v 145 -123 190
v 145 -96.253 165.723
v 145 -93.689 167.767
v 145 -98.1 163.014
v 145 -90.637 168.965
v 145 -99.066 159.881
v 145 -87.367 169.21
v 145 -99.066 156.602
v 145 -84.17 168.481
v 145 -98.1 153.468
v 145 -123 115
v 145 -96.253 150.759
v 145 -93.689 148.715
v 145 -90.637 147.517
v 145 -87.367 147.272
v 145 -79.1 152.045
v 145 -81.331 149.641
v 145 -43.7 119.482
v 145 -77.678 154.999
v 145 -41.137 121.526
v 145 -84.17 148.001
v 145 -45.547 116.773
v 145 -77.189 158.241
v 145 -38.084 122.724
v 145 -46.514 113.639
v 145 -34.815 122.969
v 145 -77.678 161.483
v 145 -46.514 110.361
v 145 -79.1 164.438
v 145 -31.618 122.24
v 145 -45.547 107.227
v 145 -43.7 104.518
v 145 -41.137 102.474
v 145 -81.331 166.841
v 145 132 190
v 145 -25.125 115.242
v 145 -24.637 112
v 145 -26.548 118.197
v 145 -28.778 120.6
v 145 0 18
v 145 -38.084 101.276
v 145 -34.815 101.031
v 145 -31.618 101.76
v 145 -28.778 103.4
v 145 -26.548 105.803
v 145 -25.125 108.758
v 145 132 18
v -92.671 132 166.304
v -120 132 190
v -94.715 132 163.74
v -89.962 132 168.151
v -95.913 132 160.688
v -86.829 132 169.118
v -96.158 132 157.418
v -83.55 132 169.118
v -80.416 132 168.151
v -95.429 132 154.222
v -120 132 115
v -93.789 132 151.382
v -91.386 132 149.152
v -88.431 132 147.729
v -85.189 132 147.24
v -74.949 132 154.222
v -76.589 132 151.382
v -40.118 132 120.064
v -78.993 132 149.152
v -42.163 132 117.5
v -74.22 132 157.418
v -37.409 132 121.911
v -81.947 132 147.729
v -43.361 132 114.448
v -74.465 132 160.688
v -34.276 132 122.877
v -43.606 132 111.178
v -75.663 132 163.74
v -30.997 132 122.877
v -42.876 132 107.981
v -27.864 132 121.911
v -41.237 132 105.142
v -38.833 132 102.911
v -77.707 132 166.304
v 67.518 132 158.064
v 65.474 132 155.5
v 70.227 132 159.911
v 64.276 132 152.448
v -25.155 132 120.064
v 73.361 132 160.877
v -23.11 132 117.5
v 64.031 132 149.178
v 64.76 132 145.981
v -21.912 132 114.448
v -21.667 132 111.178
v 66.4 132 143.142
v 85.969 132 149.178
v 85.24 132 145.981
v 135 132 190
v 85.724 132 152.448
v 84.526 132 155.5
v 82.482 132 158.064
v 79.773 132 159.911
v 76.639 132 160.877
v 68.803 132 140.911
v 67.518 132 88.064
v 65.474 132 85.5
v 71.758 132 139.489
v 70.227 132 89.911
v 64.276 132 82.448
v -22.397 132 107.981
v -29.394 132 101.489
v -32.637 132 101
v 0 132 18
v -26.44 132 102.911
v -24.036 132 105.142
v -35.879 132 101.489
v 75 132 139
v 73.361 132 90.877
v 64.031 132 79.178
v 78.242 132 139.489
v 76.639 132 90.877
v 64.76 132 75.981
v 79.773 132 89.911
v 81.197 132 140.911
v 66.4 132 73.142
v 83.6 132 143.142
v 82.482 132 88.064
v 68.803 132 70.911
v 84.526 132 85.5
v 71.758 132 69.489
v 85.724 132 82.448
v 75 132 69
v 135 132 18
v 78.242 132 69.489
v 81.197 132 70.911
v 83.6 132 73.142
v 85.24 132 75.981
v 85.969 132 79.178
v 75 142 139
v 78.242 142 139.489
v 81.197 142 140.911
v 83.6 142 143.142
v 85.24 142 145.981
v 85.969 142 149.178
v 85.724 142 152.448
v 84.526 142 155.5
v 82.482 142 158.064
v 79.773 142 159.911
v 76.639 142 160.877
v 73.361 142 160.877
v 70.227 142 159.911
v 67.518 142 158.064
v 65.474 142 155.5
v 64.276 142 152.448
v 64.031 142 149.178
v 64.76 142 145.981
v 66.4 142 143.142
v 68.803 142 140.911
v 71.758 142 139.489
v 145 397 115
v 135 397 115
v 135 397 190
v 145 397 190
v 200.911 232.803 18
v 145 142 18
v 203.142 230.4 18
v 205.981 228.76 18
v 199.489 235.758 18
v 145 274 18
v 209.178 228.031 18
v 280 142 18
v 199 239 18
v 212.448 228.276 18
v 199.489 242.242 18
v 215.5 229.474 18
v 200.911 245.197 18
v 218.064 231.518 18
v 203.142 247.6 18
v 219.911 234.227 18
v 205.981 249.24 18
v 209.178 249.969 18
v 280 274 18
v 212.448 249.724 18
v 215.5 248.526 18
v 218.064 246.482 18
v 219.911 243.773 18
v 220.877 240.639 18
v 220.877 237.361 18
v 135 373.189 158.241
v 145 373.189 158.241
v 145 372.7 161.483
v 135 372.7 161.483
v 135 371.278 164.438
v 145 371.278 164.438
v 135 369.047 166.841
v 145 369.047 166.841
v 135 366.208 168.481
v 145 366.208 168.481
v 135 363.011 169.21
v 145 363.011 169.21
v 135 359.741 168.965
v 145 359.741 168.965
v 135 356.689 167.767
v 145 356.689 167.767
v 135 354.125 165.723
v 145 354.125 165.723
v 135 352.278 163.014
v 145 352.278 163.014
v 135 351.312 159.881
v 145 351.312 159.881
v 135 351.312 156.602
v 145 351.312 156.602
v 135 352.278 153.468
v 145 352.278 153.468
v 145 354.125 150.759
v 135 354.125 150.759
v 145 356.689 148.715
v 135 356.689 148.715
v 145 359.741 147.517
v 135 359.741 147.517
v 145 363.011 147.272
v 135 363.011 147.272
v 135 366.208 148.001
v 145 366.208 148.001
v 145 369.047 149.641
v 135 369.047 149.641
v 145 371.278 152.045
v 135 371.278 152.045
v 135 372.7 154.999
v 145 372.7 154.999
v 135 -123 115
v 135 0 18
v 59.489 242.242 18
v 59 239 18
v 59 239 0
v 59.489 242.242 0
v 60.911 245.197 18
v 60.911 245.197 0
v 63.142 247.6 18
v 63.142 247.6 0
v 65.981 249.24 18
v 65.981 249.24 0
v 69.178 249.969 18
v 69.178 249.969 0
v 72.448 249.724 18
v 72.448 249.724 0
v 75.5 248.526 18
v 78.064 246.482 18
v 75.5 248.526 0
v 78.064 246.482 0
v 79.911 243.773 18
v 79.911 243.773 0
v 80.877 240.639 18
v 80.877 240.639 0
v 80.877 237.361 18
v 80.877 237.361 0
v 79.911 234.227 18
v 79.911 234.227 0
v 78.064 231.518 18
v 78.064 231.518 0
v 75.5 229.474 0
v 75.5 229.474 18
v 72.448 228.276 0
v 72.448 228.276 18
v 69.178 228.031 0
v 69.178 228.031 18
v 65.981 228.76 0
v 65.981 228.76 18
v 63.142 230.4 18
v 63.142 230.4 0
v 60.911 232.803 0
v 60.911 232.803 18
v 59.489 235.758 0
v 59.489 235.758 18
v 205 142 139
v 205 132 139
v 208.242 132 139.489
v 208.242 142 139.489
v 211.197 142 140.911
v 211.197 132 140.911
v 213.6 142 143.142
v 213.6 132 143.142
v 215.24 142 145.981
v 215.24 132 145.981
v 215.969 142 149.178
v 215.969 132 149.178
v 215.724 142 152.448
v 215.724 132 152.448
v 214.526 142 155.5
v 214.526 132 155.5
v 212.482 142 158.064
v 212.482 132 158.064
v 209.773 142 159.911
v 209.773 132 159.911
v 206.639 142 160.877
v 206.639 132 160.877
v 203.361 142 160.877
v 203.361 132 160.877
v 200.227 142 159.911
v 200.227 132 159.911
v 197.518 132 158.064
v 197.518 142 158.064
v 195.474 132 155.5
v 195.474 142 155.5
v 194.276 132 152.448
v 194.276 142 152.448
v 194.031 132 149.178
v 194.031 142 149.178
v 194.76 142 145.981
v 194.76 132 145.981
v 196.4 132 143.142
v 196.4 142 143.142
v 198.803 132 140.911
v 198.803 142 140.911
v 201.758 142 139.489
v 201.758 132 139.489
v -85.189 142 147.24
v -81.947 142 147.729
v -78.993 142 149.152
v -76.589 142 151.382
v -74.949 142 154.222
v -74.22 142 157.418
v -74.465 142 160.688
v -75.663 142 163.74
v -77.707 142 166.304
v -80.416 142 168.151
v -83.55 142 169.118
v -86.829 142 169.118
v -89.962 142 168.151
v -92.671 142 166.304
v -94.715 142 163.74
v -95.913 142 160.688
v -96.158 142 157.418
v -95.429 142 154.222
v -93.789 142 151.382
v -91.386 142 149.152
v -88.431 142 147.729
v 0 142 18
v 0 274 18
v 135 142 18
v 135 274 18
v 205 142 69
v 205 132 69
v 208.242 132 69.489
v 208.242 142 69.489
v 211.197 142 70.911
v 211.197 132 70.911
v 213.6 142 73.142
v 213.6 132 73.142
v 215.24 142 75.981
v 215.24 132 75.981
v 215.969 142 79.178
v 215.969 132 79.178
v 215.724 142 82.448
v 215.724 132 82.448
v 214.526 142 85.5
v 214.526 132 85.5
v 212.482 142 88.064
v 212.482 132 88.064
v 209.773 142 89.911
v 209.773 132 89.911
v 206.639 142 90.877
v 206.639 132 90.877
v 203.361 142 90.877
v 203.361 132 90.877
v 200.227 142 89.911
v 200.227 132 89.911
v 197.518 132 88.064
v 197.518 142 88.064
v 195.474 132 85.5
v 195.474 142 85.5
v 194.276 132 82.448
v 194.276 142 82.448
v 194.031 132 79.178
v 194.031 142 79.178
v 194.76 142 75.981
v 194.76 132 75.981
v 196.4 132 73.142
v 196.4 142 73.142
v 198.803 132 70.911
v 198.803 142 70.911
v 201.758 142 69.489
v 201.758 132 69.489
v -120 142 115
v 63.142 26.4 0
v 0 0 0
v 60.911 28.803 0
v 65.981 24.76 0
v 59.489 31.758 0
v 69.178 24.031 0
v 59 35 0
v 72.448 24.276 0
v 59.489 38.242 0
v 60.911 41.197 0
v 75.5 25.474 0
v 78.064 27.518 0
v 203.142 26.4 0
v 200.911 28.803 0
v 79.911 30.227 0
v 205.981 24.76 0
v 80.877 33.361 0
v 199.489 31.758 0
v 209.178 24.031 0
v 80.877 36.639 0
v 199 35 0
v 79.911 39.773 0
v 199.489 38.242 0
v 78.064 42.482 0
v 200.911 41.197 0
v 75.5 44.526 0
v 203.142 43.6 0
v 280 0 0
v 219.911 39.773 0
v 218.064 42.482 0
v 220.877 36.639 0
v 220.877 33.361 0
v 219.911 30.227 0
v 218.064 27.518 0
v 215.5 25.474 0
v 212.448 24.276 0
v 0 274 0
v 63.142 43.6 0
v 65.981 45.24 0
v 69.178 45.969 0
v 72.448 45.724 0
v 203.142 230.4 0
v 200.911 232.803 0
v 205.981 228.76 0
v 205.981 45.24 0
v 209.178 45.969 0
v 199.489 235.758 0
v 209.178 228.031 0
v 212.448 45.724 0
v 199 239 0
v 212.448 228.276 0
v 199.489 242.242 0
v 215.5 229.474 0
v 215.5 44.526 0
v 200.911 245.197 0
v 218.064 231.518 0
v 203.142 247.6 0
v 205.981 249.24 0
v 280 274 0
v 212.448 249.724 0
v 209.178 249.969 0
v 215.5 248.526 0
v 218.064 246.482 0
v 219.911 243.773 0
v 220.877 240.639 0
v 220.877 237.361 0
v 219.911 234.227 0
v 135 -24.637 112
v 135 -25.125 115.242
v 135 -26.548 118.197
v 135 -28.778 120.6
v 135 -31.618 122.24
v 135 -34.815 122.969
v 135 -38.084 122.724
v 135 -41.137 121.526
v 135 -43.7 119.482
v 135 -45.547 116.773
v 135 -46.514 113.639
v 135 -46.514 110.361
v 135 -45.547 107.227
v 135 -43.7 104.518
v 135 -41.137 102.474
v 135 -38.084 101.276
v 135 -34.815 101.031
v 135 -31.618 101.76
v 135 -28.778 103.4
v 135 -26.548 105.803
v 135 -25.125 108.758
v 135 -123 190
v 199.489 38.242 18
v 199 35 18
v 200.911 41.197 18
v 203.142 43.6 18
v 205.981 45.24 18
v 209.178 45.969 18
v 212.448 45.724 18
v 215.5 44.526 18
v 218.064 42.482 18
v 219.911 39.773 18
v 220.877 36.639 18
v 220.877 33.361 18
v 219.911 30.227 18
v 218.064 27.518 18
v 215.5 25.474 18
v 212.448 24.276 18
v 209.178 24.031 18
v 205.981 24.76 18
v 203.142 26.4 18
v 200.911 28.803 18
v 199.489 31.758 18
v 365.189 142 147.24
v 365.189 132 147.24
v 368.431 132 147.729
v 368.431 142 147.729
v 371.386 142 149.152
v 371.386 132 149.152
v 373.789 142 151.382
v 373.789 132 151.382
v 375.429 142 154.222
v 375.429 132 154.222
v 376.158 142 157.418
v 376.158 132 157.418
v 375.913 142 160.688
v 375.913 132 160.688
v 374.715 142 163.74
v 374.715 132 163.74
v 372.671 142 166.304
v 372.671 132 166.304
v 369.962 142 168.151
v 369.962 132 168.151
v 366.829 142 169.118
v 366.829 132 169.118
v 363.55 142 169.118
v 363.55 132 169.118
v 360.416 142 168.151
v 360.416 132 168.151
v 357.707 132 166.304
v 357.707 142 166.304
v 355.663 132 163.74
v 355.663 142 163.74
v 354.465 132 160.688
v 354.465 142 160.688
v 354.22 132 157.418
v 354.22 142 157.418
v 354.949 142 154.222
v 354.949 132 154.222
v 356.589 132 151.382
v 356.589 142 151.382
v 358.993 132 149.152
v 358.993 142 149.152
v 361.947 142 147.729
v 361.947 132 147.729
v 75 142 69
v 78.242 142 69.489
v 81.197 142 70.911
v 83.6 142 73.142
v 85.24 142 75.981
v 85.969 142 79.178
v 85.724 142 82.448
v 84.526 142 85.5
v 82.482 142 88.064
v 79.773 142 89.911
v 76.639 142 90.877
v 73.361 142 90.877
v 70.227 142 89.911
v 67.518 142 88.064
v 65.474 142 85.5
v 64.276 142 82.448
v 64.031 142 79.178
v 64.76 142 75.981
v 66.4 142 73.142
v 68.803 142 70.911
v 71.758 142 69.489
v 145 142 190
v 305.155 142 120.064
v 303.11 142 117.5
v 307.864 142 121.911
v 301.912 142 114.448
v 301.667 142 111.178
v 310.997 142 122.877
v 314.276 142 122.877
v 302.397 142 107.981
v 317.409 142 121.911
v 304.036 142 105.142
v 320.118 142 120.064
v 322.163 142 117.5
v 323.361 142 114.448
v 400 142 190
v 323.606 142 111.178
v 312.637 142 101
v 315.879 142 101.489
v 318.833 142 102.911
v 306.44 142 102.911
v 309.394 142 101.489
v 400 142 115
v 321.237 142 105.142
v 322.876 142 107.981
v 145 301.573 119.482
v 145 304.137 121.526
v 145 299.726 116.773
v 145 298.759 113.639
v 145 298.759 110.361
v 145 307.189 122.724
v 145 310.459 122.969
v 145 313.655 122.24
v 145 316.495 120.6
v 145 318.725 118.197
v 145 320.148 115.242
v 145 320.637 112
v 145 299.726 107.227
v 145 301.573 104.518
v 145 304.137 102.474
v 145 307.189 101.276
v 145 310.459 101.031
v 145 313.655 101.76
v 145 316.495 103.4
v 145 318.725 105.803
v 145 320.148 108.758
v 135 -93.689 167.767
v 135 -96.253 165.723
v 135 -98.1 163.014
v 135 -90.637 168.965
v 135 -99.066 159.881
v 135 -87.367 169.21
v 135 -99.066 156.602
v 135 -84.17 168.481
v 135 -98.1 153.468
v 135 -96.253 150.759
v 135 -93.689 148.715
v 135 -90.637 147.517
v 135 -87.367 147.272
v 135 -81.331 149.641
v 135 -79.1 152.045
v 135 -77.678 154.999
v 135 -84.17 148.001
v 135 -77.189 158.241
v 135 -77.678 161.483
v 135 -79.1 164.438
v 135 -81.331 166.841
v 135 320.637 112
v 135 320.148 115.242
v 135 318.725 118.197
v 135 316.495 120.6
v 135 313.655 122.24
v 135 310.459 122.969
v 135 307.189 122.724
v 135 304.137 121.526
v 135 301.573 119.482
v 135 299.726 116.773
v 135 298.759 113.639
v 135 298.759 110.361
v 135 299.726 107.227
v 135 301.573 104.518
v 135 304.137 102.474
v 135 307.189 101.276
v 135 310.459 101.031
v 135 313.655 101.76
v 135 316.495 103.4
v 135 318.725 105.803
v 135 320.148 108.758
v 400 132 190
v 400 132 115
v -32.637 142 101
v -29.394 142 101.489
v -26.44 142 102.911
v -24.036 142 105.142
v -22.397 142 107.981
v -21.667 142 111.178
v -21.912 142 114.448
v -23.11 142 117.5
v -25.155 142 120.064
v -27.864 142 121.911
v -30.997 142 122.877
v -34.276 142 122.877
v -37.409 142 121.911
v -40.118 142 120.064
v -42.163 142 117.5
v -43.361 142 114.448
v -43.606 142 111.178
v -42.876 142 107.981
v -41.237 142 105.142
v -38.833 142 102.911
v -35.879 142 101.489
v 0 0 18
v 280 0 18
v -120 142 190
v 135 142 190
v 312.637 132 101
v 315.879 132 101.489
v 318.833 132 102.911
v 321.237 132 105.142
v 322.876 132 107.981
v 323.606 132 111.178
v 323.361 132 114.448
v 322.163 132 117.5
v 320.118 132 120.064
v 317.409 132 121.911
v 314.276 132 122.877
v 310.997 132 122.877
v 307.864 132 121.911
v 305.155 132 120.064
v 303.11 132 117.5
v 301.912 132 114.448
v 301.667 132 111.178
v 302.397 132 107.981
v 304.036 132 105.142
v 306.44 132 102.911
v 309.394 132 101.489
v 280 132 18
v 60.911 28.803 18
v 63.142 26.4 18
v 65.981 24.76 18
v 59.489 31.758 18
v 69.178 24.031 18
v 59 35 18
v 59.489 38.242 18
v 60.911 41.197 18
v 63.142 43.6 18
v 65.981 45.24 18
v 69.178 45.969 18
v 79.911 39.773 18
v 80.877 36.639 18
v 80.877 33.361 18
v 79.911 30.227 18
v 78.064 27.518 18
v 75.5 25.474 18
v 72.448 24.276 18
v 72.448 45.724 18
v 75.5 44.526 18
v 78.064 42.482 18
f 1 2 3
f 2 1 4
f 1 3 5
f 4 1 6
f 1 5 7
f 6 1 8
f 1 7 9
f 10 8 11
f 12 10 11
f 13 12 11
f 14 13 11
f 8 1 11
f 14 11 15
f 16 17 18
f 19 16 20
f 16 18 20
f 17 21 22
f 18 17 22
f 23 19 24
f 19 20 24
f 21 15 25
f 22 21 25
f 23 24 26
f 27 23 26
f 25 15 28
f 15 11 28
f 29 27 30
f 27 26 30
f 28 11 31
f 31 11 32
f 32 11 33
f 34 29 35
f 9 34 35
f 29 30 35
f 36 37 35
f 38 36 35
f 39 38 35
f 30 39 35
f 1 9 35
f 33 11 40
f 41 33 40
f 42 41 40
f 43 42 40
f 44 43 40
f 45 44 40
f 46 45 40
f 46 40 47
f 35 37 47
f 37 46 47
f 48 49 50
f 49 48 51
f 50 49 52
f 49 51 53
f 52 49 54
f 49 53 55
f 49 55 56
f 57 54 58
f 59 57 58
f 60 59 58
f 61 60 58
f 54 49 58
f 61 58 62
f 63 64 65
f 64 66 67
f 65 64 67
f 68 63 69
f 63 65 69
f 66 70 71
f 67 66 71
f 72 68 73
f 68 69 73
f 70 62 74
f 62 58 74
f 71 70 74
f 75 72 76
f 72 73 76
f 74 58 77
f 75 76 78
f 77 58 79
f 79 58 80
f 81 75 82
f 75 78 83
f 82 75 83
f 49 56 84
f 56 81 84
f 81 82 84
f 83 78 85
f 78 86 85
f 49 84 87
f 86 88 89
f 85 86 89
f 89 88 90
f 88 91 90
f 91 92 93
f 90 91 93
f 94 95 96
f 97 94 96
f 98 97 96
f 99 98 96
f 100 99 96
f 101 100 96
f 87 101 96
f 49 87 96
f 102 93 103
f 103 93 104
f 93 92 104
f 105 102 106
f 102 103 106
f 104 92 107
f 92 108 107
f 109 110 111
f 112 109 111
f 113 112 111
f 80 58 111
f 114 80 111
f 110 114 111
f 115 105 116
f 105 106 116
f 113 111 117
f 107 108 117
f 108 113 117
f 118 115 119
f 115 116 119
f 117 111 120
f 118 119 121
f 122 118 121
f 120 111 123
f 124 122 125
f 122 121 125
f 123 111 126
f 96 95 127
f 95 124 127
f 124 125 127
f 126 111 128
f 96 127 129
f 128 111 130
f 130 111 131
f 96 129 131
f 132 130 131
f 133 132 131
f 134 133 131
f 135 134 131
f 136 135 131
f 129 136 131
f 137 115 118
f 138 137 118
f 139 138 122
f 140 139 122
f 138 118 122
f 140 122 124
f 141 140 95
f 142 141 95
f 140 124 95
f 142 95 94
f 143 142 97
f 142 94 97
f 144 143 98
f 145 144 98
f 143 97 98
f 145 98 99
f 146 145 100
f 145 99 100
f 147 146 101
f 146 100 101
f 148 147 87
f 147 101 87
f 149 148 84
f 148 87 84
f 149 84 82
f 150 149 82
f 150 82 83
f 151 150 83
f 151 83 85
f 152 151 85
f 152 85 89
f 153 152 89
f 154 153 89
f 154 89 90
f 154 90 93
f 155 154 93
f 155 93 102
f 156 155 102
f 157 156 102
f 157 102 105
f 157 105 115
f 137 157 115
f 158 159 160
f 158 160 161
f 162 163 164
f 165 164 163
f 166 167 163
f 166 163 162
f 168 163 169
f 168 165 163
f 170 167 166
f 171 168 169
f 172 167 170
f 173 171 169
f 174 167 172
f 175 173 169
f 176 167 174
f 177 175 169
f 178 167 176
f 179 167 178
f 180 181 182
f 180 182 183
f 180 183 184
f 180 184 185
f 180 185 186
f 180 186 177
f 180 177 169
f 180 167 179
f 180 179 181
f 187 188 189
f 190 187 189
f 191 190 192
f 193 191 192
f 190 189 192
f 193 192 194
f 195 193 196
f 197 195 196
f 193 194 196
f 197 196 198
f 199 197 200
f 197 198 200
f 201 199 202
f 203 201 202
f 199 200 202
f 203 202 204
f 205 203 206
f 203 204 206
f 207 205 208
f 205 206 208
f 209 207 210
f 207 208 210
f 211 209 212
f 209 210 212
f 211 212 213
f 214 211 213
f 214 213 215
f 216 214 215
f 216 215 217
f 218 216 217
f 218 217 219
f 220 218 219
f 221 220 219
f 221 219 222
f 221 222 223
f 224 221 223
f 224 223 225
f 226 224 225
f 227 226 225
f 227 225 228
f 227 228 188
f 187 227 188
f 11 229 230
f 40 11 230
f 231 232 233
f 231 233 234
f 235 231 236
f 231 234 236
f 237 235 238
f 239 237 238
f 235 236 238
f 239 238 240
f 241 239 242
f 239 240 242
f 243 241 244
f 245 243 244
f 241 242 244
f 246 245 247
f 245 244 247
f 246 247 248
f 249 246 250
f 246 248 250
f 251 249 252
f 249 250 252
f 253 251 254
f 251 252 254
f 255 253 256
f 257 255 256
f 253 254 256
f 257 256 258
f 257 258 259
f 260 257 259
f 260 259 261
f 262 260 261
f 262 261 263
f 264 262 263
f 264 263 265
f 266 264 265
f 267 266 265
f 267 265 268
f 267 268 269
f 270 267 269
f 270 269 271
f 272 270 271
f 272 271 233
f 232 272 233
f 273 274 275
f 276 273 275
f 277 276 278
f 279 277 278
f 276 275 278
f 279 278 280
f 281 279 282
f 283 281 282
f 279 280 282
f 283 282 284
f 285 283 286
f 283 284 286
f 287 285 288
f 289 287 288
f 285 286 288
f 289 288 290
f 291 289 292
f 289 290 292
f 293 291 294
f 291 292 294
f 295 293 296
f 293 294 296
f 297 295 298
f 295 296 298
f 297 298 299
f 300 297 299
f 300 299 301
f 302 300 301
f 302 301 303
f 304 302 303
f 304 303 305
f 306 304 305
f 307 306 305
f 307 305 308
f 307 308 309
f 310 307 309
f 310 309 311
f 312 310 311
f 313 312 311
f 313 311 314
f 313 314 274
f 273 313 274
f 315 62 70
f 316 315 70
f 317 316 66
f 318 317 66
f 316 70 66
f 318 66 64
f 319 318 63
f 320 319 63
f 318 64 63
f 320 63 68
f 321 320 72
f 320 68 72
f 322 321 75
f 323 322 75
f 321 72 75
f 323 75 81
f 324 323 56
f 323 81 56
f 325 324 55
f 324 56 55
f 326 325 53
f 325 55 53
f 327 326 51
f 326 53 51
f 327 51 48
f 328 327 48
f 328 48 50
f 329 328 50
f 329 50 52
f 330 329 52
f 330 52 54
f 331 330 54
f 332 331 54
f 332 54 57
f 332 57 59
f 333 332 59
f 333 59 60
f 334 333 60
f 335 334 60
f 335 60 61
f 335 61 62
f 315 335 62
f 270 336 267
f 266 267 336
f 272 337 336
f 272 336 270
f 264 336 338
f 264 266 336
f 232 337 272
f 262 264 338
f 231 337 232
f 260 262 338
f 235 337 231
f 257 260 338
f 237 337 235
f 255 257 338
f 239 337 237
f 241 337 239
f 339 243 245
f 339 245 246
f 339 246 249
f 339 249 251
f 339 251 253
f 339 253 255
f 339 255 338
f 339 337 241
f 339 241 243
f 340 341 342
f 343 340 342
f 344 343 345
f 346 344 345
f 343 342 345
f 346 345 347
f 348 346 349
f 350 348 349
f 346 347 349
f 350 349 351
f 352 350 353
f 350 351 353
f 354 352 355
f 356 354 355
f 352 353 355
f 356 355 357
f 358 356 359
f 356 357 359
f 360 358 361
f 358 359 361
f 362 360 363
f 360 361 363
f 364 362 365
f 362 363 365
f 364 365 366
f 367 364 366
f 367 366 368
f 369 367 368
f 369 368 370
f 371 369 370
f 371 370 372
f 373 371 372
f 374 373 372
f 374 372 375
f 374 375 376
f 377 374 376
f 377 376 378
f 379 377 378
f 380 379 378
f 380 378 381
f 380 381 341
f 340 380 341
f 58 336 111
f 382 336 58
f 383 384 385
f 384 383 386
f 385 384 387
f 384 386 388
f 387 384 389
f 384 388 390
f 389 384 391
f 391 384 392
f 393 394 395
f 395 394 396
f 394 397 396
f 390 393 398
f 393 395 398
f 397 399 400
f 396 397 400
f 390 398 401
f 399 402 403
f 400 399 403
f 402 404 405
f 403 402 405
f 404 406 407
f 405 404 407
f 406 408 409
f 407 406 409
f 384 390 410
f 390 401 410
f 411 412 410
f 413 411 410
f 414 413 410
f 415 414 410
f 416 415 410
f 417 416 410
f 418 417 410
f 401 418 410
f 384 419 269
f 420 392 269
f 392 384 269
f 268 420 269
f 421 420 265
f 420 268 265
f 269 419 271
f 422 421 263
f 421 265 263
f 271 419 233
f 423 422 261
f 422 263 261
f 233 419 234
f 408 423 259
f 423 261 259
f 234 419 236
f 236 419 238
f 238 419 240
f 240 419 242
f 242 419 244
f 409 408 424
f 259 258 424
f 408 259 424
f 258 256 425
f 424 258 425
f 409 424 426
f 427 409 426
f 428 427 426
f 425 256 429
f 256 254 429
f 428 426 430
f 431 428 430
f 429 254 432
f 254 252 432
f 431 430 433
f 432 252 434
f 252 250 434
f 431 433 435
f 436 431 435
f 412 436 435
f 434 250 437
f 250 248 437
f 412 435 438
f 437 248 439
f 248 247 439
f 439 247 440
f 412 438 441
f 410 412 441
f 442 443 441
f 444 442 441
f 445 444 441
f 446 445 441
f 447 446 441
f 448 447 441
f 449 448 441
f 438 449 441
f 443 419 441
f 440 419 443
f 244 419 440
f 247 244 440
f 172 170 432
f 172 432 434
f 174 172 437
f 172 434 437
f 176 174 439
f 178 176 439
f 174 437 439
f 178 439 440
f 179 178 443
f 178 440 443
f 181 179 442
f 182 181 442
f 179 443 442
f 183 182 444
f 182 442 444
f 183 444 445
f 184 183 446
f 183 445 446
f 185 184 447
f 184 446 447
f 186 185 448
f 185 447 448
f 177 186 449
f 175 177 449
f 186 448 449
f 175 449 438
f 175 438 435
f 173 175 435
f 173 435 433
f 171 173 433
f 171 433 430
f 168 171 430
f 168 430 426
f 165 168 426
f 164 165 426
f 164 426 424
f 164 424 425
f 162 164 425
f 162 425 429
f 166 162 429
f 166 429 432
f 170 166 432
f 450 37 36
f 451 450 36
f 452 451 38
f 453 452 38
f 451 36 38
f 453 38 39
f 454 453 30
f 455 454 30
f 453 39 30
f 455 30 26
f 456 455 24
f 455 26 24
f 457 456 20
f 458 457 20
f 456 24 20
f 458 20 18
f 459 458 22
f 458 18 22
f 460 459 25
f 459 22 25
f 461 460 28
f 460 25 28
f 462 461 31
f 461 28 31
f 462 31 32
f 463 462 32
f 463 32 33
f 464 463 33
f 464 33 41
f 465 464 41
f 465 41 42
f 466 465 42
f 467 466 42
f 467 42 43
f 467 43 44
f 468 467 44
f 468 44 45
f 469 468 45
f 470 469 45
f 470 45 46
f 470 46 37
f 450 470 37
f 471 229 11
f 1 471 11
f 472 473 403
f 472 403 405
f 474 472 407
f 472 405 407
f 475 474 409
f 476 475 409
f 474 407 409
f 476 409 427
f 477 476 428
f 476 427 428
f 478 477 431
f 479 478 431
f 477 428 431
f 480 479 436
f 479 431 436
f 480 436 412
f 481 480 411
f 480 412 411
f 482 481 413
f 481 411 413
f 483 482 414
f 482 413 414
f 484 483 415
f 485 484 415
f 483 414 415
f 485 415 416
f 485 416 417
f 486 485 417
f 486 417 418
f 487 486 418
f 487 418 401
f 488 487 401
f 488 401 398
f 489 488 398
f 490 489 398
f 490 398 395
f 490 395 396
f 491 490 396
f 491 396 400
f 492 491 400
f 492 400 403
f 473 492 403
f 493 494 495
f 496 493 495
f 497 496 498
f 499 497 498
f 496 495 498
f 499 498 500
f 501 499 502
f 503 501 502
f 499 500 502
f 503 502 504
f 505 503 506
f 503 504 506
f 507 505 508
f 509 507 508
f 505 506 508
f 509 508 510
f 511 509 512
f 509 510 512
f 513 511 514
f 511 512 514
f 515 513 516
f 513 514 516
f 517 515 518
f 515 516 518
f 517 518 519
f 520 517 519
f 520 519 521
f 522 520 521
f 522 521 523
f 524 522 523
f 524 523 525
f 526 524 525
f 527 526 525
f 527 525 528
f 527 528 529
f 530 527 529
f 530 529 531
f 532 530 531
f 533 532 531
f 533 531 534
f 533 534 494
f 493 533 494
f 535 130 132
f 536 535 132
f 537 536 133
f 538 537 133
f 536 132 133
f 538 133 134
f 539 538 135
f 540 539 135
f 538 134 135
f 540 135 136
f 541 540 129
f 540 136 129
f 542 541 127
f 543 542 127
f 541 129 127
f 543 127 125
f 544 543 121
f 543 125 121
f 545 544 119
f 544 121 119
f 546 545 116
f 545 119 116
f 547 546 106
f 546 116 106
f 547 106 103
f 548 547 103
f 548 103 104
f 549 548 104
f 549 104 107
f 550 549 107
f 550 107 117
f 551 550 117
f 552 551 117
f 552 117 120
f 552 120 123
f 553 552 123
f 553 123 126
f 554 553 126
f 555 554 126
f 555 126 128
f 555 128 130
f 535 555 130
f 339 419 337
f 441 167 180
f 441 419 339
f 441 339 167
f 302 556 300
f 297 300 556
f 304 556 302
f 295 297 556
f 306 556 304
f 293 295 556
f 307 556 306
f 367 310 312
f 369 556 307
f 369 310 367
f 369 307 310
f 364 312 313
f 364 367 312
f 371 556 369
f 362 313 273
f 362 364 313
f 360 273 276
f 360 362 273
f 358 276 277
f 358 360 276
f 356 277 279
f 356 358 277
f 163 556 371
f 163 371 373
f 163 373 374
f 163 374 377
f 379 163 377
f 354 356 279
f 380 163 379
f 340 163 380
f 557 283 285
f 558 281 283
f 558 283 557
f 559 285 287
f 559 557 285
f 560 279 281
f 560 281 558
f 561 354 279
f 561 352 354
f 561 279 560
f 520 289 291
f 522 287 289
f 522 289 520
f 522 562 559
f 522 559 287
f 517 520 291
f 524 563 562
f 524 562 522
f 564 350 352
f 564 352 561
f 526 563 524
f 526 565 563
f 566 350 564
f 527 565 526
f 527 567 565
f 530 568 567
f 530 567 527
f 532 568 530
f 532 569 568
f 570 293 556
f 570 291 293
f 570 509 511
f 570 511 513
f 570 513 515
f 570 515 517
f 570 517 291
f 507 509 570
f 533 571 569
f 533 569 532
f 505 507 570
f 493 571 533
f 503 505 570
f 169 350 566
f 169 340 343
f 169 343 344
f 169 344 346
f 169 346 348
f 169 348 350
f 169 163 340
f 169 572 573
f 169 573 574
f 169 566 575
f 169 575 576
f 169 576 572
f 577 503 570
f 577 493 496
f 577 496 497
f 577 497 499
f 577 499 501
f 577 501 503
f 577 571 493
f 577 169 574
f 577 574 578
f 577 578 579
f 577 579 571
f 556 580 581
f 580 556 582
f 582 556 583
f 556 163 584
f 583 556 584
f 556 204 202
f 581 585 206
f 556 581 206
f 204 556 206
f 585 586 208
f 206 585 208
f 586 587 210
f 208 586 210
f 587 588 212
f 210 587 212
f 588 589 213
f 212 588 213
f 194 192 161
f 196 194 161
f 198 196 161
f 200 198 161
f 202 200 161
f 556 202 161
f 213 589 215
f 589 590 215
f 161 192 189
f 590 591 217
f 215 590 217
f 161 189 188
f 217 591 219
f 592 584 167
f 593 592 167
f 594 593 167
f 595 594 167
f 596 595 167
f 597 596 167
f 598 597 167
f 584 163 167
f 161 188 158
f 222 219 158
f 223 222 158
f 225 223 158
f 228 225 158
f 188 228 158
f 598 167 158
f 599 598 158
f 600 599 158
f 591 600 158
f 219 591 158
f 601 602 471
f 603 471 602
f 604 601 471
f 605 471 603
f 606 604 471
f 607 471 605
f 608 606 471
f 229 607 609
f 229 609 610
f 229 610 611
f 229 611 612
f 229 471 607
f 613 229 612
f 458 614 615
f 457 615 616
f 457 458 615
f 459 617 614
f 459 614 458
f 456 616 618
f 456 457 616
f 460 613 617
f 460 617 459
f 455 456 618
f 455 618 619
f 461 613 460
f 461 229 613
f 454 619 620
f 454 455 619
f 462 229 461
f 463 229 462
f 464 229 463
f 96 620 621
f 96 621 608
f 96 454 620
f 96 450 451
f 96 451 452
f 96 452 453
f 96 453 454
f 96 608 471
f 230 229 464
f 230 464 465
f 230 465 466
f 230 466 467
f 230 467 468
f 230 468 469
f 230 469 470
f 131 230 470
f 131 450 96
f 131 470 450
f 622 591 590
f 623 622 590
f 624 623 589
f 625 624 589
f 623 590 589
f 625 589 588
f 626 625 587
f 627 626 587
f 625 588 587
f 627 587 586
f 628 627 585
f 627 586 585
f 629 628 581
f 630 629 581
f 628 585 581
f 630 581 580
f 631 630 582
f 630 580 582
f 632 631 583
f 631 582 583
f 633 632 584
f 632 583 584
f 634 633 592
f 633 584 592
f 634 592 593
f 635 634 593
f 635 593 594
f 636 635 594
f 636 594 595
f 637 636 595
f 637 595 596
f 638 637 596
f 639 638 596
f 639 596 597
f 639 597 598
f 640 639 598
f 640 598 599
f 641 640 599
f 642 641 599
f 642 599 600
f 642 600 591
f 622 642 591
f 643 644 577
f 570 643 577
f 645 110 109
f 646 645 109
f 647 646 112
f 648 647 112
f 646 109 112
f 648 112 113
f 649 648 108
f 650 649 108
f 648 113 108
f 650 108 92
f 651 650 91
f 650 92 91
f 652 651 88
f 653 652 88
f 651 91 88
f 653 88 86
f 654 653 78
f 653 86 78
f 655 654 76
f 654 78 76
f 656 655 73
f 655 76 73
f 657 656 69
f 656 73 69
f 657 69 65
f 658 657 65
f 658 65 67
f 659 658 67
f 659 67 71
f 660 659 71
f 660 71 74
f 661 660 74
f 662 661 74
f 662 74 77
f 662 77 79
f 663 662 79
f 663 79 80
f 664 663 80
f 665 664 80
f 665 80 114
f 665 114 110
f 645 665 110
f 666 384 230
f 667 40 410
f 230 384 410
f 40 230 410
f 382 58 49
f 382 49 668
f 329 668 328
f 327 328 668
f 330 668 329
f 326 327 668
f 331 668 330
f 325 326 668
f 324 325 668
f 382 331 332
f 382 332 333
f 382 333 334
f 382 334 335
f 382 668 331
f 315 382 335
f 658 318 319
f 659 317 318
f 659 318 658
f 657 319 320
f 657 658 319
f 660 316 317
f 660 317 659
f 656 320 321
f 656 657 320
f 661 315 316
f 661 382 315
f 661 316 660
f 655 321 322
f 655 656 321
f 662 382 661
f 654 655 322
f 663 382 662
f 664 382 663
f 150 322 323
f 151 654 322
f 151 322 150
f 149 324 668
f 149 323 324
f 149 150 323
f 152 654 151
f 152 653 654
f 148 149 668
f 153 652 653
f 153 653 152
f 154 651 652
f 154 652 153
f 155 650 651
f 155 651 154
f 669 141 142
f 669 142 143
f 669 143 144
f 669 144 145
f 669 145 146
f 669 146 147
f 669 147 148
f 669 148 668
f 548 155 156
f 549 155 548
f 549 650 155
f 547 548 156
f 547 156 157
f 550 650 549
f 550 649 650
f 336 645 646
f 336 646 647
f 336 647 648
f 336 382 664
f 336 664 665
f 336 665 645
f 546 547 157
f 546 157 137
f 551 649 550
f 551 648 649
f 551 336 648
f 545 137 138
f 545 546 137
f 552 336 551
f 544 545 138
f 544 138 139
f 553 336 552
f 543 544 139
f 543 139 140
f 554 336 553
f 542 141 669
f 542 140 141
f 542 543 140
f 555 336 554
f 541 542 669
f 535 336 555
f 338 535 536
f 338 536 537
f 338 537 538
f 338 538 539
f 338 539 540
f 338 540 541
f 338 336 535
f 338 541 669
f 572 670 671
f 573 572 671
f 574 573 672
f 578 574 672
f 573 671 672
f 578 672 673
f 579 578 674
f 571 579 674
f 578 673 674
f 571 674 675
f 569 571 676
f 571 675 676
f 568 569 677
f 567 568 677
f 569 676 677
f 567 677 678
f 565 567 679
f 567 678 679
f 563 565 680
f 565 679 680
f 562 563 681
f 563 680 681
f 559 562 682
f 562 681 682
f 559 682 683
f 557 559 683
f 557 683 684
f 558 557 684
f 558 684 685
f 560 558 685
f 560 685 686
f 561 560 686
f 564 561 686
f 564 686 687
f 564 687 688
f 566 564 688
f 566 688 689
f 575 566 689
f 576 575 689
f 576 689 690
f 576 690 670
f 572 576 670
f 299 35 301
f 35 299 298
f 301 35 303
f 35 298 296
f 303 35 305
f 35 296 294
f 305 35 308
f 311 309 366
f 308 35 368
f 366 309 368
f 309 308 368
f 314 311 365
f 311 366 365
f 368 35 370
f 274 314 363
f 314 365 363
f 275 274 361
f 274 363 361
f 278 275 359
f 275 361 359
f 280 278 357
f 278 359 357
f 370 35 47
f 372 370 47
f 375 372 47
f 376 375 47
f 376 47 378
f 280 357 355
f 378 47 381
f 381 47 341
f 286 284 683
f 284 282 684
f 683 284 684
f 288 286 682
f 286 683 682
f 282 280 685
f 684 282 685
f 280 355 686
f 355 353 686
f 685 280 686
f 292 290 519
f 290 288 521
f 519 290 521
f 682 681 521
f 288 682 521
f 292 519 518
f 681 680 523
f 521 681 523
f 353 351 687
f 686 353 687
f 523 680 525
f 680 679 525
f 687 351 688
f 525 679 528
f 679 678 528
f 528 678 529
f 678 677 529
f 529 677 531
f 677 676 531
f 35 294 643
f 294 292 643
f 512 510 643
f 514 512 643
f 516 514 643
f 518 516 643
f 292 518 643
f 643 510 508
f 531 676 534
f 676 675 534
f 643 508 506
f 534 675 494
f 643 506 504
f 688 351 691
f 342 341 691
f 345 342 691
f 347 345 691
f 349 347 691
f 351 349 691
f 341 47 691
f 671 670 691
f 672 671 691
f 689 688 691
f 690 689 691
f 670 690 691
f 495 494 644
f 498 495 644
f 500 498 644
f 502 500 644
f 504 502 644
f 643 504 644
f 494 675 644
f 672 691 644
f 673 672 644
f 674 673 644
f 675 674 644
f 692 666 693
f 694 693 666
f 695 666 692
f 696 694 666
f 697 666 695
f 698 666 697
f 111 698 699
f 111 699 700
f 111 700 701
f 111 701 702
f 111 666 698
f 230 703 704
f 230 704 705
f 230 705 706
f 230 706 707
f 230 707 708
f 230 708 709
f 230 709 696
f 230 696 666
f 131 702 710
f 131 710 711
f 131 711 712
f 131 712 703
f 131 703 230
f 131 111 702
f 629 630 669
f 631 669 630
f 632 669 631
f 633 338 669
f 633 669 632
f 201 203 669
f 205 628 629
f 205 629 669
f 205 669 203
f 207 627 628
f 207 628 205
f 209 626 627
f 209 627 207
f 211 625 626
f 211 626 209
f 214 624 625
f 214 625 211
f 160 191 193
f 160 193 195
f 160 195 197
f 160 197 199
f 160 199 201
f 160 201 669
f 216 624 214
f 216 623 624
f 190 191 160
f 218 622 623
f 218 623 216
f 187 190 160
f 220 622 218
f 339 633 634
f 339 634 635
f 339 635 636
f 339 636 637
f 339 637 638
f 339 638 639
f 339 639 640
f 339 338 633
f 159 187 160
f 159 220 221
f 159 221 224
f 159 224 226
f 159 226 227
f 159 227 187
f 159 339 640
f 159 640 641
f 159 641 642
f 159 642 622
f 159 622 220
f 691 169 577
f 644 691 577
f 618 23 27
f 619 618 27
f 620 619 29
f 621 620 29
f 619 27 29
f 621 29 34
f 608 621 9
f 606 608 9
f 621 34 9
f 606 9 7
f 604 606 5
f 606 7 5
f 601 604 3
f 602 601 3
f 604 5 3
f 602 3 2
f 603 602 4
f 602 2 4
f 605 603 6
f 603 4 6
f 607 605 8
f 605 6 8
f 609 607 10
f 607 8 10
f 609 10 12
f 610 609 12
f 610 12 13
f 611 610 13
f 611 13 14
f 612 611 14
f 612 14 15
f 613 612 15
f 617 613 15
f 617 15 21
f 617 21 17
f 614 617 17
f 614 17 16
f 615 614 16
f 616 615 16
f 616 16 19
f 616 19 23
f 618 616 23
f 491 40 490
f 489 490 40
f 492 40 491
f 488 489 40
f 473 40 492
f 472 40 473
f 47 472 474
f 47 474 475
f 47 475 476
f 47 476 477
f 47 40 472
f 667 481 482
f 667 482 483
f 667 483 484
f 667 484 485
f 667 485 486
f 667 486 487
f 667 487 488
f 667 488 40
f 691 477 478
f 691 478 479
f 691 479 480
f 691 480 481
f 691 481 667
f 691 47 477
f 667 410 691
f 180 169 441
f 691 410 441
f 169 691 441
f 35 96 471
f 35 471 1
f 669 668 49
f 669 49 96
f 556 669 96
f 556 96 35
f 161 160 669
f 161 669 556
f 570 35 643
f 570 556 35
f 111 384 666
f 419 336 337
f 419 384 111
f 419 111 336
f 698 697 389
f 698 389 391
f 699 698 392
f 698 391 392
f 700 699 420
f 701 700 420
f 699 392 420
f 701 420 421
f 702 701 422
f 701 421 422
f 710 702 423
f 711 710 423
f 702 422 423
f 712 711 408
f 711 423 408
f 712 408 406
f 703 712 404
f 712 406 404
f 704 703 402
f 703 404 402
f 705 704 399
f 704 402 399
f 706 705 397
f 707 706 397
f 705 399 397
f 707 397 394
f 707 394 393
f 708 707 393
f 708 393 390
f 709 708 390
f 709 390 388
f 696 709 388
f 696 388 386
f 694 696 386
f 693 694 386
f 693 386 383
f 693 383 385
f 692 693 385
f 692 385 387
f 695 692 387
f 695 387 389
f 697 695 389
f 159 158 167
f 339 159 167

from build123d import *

# Parameters (mm, degrees)
SKETCH_1_W                  = 280
SKETCH_1_H                  = 274
EXTRUDE_1_DEPTH             = 18
SKETCH_2_W                  = 520
SKETCH_2_H                  = 10
EXTRUDE_2_DEPTH             = 172
SKETCH_3_W                  = 10
SKETCH_3_H                  = 520
EXTRUDE_3_DEPTH             = 172
CUT_EXTRUDE_1_DEPTH         = 514.745072969
CUT_EXTRUDE_2_DEPTH         = 514.745072969
CUT_EXTRUDE_3_DEPTH         = 517.066856134
CUT_EXTRUDE_4_DEPTH         = 517.066856134
SKETCH_9_R                  = 11.000000001
SKETCH_9_R_2                = 11
CUT_EXTRUDE_5_DEPTH         = 517.066856134
SKETCH_10_R                 = 11
CUT_EXTRUDE_6_DEPTH         = 514.745072969
SKETCH_11_R                 = 11
CUT_EXTRUDE_7_DEPTH         = 595.734394499
PATTERN_LINEAR_1_COUNT      = 2
PATTERN_LINEAR_1_PITCH      = 140
PATTERN_LINEAR_1_COUNT_DIR2 = 2
PATTERN_LINEAR_1_PITCH_DIR2 = 204


with BuildPart() as part:
    # 草图1 → 拉伸1 (new body)
    with BuildSketch(Plane.XY):
        with Locations((140, 137)):
            Rectangle(SKETCH_1_W, SKETCH_1_H)
    extrude(amount=EXTRUDE_1_DEPTH)

    # 草图2 → 拉伸2 (add)
    with BuildSketch(Plane.XY.offset(18)):
        with Locations((140, 137)):
            Rectangle(SKETCH_2_W, SKETCH_2_H)
    extrude(amount=EXTRUDE_2_DEPTH)

    # 草图3 → 拉伸3 (add)
    with BuildSketch(Plane.XY.offset(18)):
        with Locations((140, 137)):
            Rectangle(SKETCH_3_W, SKETCH_3_H)
    extrude(amount=EXTRUDE_3_DEPTH)

    # 草图4 → 切除-拉伸1 (cut, through all)
    with BuildSketch(Plane(origin=(145, 0, 0), x_dir=(0, 0, -1), z_dir=(1, 0, 0))):
        Polygon((-115, 397), (-18, 274), (-18, 397), align=None)
    extrude(amount=-CUT_EXTRUDE_1_DEPTH, mode=Mode.SUBTRACT)

    # 草图5 → 切除-拉伸2 (cut, through all)
    with BuildSketch(Plane.ZY.offset(-135)):
        Polygon((115, -123), (18, 0), (18, -123), align=None)
    extrude(amount=-CUT_EXTRUDE_2_DEPTH, mode=Mode.SUBTRACT)

    # 草图6 → 切除-拉伸3 (cut, through all)
    with BuildSketch(Plane(origin=(0, 142, 0), x_dir=(1, 0, 0), z_dir=(0, 1, 0))):
        Polygon((280, -18), (400, -115), (400, -18), align=None)
    extrude(amount=-CUT_EXTRUDE_3_DEPTH, mode=Mode.SUBTRACT)

    # 草图8 → 切除-拉伸4 (cut, through all)
    with BuildSketch(Plane(origin=(0, 142, 0), x_dir=(1, 0, 0), z_dir=(0, 1, 0))):
        Polygon((0, -18), (-120, -115), (-120, -18), align=None)
    extrude(amount=-CUT_EXTRUDE_4_DEPTH, mode=Mode.SUBTRACT)

    # 草图9 → 切除-拉伸5 (cut, through all)
    with BuildSketch(Plane.XZ.offset(-132)):
        with Locations(Location((-85.189055636, 158.240447361, 0), (0, 0, 270))):
            Circle(SKETCH_9_R)
        with Locations(Location((75, 150, 0), (0, 0, 270))):
            Circle(SKETCH_9_R_2)
        with Locations(Location((-32.636595866, 112, 0), (0, 0, 270))):
            Circle(SKETCH_9_R_2)
        with Locations(Location((75, 80, 0), (0, 0, 270))):
            Circle(SKETCH_9_R_2)
        with Locations(Location((205, 150, 0), (0, 0, 270))):
            Circle(SKETCH_9_R_2)
        with Locations(Location((205, 80, 0), (0, 0, 270))):
            Circle(SKETCH_9_R_2)
        with Locations(Location((365.189055636, 158.240447361, 0), (0, 0, 270))):
            Circle(SKETCH_9_R)
        with Locations(Location((312.636595866, 112, 0), (0, 0, 270))):
            Circle(SKETCH_9_R_2)
    extrude(amount=-CUT_EXTRUDE_5_DEPTH, mode=Mode.SUBTRACT)

    # 草图10 → 切除-拉伸6 (cut, through all)
    with BuildSketch(Plane(origin=(145, 0, 0), x_dir=(0, 0, -1), z_dir=(1, 0, 0))):
        with Locations(Location((-158.241096139, 362.189055636, 0), (0, 0, 90))):
            Circle(SKETCH_10_R)
        with Locations(Location((-112, 309.636595866, 0), (0, 0, 90))):
            Circle(SKETCH_10_R)
        with Locations(Location((-112, -35.636595866, 0), (0, 0, 90))):
            Circle(SKETCH_10_R)
        with Locations(Location((-158.241096139, -88.189055636, 0), (0, 0, 90))):
            Circle(SKETCH_10_R)
    extrude(amount=-CUT_EXTRUDE_6_DEPTH, mode=Mode.SUBTRACT)

    # 草图11 → 切除-拉伸7 (cut, through all)
    with BuildSketch(Plane(origin=(0, 0, 0), x_dir=(-1, 0, 0), z_dir=(0, 0, -1))):
        with Locations((-210, 35)):
            Circle(SKETCH_11_R)
    cut_extrude_7 = extrude(amount=-CUT_EXTRUDE_7_DEPTH, mode=Mode.SUBTRACT)

    # 阵列(线性)1: Cut-Extrude 7 2 × 2
    with Locations(*[(-i * PATTERN_LINEAR_1_PITCH, j * PATTERN_LINEAR_1_PITCH_DIR2, 0) for i in range(PATTERN_LINEAR_1_COUNT) for j in range(PATTERN_LINEAR_1_COUNT_DIR2) if (i, j) != (0, 0)]):
        add(cut_extrude_7, mode=Mode.SUBTRACT)


solid = part.part
